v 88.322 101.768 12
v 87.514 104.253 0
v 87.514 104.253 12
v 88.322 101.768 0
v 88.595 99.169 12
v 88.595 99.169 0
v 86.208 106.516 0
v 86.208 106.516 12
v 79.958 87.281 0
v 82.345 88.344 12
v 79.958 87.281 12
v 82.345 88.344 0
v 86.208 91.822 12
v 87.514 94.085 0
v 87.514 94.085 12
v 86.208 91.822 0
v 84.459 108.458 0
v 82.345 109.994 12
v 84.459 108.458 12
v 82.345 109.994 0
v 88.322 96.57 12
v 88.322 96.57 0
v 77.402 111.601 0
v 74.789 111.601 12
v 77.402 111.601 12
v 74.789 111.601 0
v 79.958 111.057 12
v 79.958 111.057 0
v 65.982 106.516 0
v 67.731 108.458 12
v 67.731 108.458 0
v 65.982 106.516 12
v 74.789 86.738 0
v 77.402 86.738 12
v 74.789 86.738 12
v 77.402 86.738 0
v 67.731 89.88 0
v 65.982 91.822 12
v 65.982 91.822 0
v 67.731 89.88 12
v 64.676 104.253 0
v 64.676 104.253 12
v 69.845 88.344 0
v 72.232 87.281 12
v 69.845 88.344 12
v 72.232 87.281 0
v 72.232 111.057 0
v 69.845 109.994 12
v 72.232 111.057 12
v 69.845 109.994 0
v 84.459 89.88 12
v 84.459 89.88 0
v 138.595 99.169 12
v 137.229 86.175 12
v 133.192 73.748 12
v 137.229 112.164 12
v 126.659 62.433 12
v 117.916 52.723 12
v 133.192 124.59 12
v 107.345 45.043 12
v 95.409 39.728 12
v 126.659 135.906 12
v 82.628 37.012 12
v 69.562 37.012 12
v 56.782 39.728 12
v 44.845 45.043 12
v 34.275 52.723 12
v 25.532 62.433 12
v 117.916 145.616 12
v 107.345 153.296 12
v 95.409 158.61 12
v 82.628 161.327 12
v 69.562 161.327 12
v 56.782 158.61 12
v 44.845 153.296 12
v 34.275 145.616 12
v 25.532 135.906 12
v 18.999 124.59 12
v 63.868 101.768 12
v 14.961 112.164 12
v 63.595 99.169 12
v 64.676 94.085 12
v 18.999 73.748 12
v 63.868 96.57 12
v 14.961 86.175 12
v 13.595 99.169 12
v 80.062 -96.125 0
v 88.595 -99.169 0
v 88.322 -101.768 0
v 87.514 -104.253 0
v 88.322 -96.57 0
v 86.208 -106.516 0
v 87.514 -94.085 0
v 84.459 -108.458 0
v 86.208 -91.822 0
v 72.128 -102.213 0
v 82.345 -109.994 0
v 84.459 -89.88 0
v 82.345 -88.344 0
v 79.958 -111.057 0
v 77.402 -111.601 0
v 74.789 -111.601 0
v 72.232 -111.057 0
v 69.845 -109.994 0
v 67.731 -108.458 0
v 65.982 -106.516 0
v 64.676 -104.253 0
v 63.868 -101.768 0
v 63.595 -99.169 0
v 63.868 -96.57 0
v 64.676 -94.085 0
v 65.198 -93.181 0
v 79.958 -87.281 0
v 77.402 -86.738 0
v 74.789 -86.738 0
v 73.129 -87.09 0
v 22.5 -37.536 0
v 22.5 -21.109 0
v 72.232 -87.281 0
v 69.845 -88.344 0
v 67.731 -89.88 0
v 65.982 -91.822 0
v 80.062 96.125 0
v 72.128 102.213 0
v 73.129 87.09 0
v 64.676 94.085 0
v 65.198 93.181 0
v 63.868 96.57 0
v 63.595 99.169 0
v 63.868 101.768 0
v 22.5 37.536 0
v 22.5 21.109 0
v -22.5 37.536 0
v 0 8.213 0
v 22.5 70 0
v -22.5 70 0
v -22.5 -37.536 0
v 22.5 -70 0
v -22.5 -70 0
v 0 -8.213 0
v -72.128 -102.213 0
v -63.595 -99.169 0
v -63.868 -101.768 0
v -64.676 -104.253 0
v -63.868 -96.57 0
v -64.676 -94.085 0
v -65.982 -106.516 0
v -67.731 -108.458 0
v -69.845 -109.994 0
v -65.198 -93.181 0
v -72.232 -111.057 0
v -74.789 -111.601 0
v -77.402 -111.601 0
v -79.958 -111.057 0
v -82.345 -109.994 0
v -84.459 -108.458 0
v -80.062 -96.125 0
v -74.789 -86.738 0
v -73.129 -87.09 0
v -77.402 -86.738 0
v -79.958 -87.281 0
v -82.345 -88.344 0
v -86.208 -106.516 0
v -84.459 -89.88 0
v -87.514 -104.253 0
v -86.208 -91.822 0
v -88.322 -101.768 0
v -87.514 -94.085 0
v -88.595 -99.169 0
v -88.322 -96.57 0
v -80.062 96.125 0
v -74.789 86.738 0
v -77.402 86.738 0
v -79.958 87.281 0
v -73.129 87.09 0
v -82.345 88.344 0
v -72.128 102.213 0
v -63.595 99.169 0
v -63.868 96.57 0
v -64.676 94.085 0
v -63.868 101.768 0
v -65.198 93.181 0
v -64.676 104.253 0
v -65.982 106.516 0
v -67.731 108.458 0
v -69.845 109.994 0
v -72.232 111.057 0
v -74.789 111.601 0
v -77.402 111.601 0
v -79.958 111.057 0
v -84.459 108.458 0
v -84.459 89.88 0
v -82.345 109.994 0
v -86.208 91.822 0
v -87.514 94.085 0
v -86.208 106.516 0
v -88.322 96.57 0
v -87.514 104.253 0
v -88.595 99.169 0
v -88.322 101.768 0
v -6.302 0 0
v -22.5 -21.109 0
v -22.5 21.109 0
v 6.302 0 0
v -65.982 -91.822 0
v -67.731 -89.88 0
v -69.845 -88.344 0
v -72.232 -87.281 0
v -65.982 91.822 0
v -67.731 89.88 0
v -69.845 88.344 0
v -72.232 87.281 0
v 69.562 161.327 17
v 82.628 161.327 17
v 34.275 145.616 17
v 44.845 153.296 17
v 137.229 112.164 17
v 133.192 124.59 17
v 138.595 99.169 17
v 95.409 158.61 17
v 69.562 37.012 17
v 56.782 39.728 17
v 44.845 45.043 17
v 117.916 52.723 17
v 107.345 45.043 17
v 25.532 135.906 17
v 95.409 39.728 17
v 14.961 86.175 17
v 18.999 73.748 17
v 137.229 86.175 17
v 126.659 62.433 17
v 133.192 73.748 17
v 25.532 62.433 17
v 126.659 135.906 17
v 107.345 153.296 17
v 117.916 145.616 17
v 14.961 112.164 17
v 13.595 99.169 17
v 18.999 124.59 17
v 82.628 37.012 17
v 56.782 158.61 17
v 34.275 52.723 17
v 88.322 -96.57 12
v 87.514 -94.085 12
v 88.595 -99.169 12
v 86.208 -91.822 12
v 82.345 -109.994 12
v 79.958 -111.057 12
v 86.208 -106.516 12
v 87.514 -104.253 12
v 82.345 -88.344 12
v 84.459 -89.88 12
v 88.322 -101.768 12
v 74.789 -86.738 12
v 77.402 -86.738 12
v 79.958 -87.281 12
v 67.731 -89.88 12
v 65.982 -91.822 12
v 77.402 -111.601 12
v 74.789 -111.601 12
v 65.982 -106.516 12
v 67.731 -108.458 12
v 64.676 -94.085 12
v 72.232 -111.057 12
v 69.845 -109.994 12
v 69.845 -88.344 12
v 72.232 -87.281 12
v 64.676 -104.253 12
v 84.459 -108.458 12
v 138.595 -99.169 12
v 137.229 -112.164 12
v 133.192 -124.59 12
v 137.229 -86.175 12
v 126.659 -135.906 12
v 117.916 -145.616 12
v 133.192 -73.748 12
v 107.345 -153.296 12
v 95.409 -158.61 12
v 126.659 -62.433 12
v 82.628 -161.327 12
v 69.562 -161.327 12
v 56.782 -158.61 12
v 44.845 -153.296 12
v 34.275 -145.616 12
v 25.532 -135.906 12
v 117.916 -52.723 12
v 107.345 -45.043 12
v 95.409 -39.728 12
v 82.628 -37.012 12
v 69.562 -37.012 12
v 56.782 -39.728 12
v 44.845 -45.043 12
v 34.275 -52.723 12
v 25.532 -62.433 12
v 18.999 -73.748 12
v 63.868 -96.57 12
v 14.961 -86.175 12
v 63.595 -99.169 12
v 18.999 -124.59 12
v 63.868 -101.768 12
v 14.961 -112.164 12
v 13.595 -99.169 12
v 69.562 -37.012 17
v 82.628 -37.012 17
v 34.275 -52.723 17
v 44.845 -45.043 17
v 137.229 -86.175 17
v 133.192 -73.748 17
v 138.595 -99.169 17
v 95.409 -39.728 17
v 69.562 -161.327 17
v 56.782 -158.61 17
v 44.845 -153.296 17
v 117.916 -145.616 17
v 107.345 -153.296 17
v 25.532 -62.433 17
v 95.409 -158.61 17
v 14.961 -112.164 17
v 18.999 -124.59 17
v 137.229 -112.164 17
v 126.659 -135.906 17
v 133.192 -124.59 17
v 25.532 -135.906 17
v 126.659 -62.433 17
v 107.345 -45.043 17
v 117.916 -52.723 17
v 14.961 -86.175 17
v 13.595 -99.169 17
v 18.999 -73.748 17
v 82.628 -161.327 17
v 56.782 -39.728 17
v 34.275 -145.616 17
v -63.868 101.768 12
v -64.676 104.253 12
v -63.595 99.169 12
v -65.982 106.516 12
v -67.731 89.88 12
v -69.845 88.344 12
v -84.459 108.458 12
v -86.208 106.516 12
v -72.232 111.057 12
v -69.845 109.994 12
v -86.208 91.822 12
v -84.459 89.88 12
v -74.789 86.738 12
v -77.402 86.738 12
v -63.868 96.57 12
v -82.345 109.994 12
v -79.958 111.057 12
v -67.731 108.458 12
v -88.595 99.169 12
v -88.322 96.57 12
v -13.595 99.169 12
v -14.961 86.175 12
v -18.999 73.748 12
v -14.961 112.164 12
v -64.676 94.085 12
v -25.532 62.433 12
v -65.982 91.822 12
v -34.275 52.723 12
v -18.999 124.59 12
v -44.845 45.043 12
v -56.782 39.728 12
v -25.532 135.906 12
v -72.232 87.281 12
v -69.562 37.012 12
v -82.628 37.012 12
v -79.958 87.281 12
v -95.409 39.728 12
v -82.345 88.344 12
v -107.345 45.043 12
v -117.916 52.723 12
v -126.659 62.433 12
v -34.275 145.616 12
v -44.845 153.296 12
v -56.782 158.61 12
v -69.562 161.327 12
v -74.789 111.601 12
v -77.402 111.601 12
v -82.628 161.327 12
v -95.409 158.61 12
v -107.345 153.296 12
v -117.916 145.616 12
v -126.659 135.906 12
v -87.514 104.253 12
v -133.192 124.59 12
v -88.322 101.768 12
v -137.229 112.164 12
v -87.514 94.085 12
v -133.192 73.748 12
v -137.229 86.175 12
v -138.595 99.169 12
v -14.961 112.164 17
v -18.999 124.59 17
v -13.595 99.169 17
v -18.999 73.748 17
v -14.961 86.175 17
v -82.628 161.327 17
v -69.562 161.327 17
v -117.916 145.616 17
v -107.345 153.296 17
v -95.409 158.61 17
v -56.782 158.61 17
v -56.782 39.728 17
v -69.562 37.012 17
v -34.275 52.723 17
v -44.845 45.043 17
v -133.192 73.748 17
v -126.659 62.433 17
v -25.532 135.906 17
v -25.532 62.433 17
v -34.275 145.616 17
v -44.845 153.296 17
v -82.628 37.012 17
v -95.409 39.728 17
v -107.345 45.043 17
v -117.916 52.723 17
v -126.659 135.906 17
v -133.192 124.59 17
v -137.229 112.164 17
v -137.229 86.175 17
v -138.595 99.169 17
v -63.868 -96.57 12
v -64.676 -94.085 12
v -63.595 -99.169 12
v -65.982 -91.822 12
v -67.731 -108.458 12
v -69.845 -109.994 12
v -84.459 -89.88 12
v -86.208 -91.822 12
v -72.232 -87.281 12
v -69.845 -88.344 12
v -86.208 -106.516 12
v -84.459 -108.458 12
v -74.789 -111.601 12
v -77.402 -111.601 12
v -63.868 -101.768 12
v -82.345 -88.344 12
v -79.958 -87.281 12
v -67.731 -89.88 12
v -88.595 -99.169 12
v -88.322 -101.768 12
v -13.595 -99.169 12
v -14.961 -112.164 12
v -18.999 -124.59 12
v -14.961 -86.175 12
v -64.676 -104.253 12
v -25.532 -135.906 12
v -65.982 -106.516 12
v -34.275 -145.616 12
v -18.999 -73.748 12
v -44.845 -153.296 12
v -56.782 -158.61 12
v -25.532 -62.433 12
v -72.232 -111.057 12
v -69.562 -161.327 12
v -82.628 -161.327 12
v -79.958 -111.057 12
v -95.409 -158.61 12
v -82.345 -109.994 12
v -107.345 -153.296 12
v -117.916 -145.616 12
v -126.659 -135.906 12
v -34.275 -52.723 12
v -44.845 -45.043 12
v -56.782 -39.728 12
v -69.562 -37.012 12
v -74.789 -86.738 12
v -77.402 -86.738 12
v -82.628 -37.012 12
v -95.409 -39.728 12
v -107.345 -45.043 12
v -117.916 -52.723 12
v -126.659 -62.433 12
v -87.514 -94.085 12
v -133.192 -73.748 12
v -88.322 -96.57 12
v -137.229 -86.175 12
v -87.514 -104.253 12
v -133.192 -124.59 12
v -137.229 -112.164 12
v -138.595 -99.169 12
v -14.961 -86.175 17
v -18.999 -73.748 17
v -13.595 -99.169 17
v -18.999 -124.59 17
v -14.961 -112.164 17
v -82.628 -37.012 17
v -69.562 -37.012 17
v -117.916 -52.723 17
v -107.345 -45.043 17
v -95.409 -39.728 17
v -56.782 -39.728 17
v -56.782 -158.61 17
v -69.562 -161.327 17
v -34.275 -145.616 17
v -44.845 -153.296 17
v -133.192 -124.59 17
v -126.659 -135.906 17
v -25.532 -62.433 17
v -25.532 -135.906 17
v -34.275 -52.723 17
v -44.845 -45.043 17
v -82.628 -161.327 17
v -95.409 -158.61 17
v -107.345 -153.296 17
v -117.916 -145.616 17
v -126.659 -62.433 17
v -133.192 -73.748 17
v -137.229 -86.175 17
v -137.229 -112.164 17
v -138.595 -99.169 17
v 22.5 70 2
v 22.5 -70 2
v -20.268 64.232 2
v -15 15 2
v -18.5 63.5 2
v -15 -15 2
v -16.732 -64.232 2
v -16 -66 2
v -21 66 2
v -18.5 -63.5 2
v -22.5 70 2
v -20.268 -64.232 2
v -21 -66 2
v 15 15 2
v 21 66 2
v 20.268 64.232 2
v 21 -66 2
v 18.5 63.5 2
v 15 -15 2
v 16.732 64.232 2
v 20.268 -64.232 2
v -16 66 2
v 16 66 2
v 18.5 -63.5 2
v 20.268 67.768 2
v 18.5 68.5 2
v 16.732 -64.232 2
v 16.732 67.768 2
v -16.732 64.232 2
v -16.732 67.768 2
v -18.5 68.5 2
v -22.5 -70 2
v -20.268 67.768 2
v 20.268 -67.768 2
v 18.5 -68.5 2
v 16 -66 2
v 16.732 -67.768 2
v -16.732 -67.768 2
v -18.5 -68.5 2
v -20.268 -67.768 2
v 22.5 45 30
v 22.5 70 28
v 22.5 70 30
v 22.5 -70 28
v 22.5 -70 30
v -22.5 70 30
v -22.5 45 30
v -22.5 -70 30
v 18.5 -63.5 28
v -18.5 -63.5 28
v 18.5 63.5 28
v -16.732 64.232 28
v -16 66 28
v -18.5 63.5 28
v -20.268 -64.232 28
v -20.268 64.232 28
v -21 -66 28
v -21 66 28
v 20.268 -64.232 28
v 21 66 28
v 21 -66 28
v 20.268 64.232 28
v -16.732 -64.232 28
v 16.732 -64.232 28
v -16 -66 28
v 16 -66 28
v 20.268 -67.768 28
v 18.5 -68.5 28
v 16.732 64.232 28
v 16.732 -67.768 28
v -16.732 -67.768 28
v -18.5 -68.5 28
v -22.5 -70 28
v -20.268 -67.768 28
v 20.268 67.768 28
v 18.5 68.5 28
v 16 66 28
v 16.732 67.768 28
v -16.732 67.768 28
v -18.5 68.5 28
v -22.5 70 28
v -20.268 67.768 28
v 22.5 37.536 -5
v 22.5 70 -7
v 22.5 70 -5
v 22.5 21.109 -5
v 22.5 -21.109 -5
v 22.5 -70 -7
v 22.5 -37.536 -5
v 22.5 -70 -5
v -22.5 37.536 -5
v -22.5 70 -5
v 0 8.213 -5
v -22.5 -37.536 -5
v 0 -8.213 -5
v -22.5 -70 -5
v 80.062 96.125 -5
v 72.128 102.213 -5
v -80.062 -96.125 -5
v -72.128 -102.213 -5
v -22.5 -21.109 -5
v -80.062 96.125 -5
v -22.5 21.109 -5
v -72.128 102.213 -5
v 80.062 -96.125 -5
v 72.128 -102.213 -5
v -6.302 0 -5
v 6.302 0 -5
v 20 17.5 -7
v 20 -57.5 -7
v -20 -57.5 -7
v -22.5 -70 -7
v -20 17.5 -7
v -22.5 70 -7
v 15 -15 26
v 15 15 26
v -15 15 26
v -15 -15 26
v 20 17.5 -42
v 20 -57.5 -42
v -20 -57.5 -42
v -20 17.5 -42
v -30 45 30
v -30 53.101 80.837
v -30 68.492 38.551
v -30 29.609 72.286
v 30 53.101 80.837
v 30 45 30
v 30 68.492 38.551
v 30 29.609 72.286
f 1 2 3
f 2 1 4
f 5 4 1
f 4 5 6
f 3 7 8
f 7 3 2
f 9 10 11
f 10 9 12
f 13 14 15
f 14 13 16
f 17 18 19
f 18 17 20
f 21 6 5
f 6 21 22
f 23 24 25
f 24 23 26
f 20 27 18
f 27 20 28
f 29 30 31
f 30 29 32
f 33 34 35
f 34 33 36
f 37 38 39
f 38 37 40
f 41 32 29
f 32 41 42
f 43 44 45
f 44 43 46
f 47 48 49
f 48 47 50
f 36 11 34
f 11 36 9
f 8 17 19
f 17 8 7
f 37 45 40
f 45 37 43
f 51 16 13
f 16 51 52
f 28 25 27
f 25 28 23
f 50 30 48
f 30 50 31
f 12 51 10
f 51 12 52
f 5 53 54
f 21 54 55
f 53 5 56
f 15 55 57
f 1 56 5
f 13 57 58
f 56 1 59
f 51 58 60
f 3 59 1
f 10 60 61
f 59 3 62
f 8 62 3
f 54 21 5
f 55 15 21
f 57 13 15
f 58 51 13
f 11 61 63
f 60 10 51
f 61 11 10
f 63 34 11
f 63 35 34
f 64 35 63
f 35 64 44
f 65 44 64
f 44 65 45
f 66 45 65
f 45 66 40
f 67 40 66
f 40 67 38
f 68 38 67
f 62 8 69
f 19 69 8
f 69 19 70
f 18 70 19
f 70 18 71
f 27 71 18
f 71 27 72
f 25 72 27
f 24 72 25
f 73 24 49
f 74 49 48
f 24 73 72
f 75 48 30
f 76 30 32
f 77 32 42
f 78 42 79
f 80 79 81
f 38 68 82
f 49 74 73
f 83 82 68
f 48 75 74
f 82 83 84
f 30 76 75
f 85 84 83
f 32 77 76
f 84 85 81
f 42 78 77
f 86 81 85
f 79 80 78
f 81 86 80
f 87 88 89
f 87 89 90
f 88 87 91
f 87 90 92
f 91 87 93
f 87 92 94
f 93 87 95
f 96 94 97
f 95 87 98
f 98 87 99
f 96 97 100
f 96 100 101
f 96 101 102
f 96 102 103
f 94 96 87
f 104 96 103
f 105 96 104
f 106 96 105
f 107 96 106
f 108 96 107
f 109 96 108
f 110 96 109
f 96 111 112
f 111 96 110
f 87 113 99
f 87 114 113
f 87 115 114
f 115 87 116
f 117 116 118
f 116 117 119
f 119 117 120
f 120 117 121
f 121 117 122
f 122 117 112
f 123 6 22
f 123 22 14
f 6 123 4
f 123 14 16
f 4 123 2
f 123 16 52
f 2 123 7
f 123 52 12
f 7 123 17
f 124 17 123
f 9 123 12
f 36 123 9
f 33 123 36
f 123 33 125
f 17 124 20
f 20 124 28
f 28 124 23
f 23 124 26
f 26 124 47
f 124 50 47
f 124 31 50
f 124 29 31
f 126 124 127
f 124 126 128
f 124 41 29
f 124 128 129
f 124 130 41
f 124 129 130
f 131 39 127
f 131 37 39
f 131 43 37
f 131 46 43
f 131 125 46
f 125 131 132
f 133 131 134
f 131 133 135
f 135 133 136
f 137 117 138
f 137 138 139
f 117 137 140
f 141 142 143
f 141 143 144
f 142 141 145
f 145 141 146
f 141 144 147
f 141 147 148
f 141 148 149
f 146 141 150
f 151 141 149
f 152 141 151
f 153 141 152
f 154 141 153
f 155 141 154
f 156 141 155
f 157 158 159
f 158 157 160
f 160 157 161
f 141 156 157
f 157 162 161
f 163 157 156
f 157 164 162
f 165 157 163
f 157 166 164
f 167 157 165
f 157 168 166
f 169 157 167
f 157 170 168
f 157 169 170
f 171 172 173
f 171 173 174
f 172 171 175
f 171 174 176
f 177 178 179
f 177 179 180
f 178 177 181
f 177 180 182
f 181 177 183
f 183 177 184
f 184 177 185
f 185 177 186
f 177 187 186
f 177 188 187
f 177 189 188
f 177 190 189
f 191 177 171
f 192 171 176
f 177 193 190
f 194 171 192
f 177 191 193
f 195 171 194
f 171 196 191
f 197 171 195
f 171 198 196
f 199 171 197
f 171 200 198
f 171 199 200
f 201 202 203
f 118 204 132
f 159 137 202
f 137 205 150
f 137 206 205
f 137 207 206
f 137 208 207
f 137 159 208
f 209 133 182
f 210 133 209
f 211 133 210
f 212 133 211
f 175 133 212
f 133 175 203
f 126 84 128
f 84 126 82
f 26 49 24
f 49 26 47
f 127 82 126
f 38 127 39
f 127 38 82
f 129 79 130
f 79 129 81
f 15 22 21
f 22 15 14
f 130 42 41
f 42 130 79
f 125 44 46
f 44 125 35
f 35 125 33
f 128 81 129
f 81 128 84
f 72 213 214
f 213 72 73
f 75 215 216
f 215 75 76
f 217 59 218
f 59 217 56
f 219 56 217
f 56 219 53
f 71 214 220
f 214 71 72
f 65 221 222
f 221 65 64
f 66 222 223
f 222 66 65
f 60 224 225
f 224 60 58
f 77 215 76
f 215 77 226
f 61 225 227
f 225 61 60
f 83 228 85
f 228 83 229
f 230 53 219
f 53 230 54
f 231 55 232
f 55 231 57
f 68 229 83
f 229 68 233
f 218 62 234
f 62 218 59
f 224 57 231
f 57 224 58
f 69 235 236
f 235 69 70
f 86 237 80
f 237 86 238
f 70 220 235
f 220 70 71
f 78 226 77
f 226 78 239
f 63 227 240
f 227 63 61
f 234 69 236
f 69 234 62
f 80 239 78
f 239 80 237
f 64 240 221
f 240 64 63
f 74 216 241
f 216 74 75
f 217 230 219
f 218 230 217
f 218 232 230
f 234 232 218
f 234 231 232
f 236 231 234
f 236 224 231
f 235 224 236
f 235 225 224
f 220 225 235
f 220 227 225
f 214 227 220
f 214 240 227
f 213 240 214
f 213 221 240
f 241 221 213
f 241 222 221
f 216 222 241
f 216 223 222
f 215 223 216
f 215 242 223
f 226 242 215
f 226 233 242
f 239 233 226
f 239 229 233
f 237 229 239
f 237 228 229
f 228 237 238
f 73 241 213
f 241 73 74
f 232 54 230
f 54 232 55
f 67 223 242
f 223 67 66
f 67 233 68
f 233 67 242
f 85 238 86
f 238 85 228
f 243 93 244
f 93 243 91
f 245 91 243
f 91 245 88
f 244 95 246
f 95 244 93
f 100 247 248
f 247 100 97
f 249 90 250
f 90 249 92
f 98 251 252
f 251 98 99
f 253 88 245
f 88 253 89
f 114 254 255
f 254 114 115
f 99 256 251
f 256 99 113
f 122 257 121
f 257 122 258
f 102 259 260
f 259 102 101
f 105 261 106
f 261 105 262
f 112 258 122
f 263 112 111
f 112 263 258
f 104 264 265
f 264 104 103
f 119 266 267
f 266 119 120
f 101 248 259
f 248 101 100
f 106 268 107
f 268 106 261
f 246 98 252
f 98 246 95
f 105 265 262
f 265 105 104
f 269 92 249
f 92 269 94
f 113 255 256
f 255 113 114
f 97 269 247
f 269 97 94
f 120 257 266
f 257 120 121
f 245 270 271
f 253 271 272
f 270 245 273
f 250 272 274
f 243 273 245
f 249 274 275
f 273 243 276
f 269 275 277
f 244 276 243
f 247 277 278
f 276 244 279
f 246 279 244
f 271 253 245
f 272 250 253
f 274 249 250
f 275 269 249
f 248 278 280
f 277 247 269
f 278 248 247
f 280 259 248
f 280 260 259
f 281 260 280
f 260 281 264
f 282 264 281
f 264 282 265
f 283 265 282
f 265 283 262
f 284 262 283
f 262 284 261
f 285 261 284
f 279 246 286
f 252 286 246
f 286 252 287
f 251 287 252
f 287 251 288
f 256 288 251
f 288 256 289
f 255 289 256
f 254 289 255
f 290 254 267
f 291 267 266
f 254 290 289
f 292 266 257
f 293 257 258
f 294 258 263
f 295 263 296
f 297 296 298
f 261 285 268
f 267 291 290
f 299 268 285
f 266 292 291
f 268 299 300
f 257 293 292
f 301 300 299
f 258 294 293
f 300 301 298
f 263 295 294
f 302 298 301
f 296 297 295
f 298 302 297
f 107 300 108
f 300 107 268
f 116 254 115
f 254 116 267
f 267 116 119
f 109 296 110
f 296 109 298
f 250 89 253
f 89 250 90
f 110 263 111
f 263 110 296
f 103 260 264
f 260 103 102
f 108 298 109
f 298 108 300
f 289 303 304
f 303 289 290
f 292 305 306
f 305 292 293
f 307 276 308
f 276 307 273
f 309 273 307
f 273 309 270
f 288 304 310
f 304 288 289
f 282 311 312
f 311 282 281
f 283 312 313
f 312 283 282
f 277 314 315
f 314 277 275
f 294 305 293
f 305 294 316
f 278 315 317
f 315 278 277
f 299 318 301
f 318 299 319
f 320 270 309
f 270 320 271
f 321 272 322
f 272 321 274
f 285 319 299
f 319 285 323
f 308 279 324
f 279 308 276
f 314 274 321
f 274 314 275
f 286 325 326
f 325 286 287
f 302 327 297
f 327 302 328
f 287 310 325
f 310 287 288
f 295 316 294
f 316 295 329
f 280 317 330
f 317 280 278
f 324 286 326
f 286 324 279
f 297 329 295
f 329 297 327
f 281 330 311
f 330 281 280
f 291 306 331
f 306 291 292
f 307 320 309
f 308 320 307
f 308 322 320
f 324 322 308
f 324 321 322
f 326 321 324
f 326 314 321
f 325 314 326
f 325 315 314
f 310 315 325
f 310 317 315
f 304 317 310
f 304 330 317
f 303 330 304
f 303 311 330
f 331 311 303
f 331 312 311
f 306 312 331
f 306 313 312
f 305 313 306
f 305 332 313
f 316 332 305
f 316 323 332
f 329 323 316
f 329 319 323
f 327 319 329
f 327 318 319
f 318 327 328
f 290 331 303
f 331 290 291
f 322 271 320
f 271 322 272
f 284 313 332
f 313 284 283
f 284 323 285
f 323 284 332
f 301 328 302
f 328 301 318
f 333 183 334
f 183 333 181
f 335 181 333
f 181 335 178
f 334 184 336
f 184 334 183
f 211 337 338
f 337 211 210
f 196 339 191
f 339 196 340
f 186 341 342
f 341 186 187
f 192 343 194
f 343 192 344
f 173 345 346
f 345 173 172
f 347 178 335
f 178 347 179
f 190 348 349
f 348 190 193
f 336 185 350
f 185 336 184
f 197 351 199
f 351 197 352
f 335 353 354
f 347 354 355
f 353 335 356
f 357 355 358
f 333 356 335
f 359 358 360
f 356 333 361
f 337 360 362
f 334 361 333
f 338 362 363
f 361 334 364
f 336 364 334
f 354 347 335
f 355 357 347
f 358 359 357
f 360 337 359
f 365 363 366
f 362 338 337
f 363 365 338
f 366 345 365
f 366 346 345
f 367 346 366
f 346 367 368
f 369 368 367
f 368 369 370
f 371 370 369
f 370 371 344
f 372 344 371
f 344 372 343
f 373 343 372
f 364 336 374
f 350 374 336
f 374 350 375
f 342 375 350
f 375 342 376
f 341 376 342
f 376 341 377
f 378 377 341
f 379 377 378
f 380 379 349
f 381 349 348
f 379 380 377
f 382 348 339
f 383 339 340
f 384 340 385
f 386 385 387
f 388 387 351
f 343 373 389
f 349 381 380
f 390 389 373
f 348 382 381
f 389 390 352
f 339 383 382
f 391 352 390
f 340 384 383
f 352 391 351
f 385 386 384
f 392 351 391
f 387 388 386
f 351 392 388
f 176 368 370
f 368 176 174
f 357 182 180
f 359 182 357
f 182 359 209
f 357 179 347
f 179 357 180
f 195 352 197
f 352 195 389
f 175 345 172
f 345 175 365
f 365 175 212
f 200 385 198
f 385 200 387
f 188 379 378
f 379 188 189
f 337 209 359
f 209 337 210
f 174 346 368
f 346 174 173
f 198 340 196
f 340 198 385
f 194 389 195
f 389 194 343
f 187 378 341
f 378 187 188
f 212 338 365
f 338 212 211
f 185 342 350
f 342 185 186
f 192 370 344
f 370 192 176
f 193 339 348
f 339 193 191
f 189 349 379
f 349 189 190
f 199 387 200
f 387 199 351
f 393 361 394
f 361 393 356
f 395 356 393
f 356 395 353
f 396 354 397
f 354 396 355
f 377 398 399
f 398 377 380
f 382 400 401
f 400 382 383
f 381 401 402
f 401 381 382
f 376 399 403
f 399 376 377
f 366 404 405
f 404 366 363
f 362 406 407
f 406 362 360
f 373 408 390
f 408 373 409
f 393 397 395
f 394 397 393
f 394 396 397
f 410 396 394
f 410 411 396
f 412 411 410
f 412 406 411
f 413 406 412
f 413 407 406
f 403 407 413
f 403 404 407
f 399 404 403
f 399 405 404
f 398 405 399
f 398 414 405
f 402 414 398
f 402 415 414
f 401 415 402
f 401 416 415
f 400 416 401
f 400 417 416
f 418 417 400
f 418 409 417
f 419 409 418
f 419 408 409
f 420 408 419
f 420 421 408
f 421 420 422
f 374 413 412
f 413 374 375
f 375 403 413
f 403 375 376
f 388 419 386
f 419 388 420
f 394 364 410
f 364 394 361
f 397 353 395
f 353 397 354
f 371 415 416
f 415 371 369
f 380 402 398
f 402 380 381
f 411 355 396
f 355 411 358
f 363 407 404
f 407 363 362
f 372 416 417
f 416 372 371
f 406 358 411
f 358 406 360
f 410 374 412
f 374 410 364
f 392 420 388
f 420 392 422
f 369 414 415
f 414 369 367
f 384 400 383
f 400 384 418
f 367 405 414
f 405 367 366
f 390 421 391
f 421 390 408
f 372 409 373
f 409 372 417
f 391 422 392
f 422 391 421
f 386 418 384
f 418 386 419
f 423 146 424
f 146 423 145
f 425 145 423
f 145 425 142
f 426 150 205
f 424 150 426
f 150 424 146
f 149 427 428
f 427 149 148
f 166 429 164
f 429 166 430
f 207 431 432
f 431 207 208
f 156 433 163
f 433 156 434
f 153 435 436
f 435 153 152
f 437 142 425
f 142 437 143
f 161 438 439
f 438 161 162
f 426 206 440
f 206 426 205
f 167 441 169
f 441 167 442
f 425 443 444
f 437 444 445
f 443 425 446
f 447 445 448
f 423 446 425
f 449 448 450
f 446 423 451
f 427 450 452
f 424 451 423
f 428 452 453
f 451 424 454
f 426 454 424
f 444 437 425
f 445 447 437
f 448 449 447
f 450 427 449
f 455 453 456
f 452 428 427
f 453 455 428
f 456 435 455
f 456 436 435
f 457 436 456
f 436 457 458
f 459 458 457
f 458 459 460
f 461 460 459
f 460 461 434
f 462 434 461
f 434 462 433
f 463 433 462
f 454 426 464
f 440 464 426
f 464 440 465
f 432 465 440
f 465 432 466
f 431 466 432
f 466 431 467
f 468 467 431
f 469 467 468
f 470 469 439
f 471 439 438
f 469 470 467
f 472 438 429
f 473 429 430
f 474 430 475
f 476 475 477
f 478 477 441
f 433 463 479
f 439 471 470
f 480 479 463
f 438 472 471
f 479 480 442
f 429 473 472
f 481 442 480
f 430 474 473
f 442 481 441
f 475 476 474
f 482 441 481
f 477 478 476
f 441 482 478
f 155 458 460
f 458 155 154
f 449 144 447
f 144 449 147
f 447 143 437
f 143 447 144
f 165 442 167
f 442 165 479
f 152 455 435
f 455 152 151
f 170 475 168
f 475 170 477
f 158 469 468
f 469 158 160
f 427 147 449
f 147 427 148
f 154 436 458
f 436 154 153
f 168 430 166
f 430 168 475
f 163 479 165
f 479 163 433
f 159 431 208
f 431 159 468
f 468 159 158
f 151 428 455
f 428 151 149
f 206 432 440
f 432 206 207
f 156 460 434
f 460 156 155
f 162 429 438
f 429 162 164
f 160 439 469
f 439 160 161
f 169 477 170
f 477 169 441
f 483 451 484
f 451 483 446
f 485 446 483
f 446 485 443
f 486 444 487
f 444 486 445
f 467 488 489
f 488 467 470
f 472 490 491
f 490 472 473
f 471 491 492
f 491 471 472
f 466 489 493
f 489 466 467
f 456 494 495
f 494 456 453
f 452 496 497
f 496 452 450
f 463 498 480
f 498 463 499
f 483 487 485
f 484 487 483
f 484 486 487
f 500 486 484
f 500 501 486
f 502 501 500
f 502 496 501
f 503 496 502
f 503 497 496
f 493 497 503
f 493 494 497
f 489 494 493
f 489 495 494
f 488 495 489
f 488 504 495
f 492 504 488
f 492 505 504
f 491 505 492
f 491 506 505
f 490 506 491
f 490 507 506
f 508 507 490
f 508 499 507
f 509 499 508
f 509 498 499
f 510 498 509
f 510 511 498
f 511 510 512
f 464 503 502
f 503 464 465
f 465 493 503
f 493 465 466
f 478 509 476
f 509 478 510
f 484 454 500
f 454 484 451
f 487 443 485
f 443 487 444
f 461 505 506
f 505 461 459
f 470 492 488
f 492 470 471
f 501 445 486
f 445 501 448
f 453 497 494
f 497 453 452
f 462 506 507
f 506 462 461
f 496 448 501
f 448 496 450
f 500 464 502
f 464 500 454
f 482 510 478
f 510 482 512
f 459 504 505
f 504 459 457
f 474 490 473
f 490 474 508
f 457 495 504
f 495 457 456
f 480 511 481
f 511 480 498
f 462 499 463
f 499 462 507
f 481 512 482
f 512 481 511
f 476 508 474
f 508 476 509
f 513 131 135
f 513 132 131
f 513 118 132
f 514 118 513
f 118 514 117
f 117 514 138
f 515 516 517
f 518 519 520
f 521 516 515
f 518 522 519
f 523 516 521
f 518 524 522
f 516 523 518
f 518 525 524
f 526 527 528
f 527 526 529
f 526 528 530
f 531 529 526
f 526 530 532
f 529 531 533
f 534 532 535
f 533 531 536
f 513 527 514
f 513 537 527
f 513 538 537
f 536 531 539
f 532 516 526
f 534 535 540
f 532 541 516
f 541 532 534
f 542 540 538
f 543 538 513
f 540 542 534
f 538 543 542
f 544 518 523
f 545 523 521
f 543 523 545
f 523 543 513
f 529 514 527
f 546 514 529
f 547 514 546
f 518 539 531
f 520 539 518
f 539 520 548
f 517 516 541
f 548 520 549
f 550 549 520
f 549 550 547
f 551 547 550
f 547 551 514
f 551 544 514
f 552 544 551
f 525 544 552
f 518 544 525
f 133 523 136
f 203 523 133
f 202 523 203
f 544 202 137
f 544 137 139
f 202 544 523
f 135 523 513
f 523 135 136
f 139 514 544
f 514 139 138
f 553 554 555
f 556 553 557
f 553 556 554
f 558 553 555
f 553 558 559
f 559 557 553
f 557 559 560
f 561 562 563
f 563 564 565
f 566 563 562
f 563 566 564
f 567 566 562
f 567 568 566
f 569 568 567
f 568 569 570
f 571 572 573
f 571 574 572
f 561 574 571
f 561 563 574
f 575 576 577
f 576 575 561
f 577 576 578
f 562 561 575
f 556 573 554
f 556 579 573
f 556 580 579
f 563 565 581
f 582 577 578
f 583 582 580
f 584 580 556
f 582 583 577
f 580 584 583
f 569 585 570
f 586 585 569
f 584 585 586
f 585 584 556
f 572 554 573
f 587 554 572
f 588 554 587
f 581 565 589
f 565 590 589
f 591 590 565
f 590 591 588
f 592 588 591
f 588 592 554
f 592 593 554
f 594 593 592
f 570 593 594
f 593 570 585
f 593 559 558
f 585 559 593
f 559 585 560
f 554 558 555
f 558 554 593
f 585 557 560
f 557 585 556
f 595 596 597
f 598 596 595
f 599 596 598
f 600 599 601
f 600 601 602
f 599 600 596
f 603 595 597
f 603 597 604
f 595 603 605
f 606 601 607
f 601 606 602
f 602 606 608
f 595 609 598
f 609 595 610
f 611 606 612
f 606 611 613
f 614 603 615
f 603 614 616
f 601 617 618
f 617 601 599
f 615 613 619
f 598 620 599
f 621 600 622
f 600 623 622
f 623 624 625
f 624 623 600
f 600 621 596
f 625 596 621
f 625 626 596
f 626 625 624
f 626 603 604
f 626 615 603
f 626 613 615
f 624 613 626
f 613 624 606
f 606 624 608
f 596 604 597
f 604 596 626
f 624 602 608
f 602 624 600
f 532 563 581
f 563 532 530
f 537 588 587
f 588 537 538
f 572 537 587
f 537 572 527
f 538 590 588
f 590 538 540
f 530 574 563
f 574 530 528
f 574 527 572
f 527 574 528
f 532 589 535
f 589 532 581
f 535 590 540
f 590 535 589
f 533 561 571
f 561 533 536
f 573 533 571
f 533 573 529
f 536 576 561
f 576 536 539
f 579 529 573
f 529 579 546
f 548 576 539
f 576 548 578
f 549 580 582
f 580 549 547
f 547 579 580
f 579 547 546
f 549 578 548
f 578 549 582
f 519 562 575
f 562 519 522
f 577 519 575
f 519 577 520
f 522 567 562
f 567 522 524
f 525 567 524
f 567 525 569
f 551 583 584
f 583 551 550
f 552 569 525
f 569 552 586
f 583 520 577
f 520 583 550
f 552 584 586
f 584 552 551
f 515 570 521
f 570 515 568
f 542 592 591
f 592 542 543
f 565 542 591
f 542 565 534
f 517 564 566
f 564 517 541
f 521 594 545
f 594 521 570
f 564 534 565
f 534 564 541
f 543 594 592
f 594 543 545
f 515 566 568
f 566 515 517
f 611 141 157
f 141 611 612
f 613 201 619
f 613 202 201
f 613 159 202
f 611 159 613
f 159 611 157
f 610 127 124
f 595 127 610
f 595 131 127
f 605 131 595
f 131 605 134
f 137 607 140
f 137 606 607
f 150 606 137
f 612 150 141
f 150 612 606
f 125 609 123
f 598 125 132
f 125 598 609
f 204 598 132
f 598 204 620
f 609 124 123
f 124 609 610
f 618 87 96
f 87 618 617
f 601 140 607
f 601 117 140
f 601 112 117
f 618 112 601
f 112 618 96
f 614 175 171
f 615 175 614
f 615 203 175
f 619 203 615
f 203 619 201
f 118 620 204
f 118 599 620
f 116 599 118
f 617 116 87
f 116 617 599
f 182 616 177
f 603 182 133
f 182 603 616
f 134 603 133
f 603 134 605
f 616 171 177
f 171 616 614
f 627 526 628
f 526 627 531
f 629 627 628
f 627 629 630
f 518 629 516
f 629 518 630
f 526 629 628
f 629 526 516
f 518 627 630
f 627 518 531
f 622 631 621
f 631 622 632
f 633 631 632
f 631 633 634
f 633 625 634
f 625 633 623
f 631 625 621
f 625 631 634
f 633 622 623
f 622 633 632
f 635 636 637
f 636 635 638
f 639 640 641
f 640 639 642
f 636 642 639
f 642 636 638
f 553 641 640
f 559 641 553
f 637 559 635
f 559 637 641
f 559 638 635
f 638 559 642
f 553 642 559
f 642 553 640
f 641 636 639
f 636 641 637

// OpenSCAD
angle = 75;

arm_length = 250;
arm_width = 10;
arm_thickness = 5;

frame_height = 28;
frame_width = 45;

//race,freestyle bus
frame_length = 140; //90,140

plate_thickness = 2;

battery_length = 75;
battery_width = 40;
battery_height = 35;

standoff_offset = 4;

battery_up=false;

color("#404040") 
  plate(0);

color("#404040") 
  plate(frame_height);
  
color("#404040") 
  plate(-arm_thickness-plate_thickness);  

x_standoff = frame_width/2-standoff_offset;
y_standoff = frame_length/2-standoff_offset;

standoff(x_standoff, y_standoff, 0);
standoff(x_standoff, -y_standoff, 0);
standoff(-x_standoff, -y_standoff, 0);
standoff(-x_standoff, y_standoff, 0);


color("#404040") 
 arm(90-angle/2);

color("#404040") 
 arm(90+angle/2);

stack();
battery(battery_up, -20);
gopro(frame_length/2, 20);

x = arm_length/2*sin(angle/2);
y = arm_length/2*cos(angle/2);
z = 0;
motor_prop([x,y,z]);
motor_prop([x,-y,z]);
motor_prop([-x,y,z]);
motor_prop([-x,-y,z]);


module arm(rotation){
 rotate([0,0, rotation]) 
  translate([-arm_length/2, -arm_width/2, - arm_thickness]) 
    cube([arm_length, arm_width, arm_thickness]);
}

module plate(z) {
        translate([-frame_width/2,-frame_length/2,z]) 
           cube([frame_width, frame_length, plate_thickness]);    
};

module motor_prop(m) {
    translate(m)
      cylinder(12, d=25);
    
    translate([m[0],m[1],m[2]+12])
      cylinder(5, d=125);
    
};

module standoff(x,y,z) {
    translate([x,y,z])
     cylinder(h=frame_height, d=5);
};


module stack() {
    color("green")
    translate([-15,-15, 0])
    cube([30,30, frame_height-plate_thickness]);
};


module battery(up, y_shift) {
    color("#400000")
        
    translate([-battery_width/2,y_shift-battery_length/2, up ? (frame_height) : (-battery_height-arm_thickness-plate_thickness)])
    cube([battery_width, battery_length, battery_height]);
};


module gopro(y_offset, camera_angle) {
    color("#606060")
    
    translate([-30, y_offset-25, frame_height+plate_thickness])
     rotate([camera_angle, 0, 0])    
     cube([60,25,45]);
};
